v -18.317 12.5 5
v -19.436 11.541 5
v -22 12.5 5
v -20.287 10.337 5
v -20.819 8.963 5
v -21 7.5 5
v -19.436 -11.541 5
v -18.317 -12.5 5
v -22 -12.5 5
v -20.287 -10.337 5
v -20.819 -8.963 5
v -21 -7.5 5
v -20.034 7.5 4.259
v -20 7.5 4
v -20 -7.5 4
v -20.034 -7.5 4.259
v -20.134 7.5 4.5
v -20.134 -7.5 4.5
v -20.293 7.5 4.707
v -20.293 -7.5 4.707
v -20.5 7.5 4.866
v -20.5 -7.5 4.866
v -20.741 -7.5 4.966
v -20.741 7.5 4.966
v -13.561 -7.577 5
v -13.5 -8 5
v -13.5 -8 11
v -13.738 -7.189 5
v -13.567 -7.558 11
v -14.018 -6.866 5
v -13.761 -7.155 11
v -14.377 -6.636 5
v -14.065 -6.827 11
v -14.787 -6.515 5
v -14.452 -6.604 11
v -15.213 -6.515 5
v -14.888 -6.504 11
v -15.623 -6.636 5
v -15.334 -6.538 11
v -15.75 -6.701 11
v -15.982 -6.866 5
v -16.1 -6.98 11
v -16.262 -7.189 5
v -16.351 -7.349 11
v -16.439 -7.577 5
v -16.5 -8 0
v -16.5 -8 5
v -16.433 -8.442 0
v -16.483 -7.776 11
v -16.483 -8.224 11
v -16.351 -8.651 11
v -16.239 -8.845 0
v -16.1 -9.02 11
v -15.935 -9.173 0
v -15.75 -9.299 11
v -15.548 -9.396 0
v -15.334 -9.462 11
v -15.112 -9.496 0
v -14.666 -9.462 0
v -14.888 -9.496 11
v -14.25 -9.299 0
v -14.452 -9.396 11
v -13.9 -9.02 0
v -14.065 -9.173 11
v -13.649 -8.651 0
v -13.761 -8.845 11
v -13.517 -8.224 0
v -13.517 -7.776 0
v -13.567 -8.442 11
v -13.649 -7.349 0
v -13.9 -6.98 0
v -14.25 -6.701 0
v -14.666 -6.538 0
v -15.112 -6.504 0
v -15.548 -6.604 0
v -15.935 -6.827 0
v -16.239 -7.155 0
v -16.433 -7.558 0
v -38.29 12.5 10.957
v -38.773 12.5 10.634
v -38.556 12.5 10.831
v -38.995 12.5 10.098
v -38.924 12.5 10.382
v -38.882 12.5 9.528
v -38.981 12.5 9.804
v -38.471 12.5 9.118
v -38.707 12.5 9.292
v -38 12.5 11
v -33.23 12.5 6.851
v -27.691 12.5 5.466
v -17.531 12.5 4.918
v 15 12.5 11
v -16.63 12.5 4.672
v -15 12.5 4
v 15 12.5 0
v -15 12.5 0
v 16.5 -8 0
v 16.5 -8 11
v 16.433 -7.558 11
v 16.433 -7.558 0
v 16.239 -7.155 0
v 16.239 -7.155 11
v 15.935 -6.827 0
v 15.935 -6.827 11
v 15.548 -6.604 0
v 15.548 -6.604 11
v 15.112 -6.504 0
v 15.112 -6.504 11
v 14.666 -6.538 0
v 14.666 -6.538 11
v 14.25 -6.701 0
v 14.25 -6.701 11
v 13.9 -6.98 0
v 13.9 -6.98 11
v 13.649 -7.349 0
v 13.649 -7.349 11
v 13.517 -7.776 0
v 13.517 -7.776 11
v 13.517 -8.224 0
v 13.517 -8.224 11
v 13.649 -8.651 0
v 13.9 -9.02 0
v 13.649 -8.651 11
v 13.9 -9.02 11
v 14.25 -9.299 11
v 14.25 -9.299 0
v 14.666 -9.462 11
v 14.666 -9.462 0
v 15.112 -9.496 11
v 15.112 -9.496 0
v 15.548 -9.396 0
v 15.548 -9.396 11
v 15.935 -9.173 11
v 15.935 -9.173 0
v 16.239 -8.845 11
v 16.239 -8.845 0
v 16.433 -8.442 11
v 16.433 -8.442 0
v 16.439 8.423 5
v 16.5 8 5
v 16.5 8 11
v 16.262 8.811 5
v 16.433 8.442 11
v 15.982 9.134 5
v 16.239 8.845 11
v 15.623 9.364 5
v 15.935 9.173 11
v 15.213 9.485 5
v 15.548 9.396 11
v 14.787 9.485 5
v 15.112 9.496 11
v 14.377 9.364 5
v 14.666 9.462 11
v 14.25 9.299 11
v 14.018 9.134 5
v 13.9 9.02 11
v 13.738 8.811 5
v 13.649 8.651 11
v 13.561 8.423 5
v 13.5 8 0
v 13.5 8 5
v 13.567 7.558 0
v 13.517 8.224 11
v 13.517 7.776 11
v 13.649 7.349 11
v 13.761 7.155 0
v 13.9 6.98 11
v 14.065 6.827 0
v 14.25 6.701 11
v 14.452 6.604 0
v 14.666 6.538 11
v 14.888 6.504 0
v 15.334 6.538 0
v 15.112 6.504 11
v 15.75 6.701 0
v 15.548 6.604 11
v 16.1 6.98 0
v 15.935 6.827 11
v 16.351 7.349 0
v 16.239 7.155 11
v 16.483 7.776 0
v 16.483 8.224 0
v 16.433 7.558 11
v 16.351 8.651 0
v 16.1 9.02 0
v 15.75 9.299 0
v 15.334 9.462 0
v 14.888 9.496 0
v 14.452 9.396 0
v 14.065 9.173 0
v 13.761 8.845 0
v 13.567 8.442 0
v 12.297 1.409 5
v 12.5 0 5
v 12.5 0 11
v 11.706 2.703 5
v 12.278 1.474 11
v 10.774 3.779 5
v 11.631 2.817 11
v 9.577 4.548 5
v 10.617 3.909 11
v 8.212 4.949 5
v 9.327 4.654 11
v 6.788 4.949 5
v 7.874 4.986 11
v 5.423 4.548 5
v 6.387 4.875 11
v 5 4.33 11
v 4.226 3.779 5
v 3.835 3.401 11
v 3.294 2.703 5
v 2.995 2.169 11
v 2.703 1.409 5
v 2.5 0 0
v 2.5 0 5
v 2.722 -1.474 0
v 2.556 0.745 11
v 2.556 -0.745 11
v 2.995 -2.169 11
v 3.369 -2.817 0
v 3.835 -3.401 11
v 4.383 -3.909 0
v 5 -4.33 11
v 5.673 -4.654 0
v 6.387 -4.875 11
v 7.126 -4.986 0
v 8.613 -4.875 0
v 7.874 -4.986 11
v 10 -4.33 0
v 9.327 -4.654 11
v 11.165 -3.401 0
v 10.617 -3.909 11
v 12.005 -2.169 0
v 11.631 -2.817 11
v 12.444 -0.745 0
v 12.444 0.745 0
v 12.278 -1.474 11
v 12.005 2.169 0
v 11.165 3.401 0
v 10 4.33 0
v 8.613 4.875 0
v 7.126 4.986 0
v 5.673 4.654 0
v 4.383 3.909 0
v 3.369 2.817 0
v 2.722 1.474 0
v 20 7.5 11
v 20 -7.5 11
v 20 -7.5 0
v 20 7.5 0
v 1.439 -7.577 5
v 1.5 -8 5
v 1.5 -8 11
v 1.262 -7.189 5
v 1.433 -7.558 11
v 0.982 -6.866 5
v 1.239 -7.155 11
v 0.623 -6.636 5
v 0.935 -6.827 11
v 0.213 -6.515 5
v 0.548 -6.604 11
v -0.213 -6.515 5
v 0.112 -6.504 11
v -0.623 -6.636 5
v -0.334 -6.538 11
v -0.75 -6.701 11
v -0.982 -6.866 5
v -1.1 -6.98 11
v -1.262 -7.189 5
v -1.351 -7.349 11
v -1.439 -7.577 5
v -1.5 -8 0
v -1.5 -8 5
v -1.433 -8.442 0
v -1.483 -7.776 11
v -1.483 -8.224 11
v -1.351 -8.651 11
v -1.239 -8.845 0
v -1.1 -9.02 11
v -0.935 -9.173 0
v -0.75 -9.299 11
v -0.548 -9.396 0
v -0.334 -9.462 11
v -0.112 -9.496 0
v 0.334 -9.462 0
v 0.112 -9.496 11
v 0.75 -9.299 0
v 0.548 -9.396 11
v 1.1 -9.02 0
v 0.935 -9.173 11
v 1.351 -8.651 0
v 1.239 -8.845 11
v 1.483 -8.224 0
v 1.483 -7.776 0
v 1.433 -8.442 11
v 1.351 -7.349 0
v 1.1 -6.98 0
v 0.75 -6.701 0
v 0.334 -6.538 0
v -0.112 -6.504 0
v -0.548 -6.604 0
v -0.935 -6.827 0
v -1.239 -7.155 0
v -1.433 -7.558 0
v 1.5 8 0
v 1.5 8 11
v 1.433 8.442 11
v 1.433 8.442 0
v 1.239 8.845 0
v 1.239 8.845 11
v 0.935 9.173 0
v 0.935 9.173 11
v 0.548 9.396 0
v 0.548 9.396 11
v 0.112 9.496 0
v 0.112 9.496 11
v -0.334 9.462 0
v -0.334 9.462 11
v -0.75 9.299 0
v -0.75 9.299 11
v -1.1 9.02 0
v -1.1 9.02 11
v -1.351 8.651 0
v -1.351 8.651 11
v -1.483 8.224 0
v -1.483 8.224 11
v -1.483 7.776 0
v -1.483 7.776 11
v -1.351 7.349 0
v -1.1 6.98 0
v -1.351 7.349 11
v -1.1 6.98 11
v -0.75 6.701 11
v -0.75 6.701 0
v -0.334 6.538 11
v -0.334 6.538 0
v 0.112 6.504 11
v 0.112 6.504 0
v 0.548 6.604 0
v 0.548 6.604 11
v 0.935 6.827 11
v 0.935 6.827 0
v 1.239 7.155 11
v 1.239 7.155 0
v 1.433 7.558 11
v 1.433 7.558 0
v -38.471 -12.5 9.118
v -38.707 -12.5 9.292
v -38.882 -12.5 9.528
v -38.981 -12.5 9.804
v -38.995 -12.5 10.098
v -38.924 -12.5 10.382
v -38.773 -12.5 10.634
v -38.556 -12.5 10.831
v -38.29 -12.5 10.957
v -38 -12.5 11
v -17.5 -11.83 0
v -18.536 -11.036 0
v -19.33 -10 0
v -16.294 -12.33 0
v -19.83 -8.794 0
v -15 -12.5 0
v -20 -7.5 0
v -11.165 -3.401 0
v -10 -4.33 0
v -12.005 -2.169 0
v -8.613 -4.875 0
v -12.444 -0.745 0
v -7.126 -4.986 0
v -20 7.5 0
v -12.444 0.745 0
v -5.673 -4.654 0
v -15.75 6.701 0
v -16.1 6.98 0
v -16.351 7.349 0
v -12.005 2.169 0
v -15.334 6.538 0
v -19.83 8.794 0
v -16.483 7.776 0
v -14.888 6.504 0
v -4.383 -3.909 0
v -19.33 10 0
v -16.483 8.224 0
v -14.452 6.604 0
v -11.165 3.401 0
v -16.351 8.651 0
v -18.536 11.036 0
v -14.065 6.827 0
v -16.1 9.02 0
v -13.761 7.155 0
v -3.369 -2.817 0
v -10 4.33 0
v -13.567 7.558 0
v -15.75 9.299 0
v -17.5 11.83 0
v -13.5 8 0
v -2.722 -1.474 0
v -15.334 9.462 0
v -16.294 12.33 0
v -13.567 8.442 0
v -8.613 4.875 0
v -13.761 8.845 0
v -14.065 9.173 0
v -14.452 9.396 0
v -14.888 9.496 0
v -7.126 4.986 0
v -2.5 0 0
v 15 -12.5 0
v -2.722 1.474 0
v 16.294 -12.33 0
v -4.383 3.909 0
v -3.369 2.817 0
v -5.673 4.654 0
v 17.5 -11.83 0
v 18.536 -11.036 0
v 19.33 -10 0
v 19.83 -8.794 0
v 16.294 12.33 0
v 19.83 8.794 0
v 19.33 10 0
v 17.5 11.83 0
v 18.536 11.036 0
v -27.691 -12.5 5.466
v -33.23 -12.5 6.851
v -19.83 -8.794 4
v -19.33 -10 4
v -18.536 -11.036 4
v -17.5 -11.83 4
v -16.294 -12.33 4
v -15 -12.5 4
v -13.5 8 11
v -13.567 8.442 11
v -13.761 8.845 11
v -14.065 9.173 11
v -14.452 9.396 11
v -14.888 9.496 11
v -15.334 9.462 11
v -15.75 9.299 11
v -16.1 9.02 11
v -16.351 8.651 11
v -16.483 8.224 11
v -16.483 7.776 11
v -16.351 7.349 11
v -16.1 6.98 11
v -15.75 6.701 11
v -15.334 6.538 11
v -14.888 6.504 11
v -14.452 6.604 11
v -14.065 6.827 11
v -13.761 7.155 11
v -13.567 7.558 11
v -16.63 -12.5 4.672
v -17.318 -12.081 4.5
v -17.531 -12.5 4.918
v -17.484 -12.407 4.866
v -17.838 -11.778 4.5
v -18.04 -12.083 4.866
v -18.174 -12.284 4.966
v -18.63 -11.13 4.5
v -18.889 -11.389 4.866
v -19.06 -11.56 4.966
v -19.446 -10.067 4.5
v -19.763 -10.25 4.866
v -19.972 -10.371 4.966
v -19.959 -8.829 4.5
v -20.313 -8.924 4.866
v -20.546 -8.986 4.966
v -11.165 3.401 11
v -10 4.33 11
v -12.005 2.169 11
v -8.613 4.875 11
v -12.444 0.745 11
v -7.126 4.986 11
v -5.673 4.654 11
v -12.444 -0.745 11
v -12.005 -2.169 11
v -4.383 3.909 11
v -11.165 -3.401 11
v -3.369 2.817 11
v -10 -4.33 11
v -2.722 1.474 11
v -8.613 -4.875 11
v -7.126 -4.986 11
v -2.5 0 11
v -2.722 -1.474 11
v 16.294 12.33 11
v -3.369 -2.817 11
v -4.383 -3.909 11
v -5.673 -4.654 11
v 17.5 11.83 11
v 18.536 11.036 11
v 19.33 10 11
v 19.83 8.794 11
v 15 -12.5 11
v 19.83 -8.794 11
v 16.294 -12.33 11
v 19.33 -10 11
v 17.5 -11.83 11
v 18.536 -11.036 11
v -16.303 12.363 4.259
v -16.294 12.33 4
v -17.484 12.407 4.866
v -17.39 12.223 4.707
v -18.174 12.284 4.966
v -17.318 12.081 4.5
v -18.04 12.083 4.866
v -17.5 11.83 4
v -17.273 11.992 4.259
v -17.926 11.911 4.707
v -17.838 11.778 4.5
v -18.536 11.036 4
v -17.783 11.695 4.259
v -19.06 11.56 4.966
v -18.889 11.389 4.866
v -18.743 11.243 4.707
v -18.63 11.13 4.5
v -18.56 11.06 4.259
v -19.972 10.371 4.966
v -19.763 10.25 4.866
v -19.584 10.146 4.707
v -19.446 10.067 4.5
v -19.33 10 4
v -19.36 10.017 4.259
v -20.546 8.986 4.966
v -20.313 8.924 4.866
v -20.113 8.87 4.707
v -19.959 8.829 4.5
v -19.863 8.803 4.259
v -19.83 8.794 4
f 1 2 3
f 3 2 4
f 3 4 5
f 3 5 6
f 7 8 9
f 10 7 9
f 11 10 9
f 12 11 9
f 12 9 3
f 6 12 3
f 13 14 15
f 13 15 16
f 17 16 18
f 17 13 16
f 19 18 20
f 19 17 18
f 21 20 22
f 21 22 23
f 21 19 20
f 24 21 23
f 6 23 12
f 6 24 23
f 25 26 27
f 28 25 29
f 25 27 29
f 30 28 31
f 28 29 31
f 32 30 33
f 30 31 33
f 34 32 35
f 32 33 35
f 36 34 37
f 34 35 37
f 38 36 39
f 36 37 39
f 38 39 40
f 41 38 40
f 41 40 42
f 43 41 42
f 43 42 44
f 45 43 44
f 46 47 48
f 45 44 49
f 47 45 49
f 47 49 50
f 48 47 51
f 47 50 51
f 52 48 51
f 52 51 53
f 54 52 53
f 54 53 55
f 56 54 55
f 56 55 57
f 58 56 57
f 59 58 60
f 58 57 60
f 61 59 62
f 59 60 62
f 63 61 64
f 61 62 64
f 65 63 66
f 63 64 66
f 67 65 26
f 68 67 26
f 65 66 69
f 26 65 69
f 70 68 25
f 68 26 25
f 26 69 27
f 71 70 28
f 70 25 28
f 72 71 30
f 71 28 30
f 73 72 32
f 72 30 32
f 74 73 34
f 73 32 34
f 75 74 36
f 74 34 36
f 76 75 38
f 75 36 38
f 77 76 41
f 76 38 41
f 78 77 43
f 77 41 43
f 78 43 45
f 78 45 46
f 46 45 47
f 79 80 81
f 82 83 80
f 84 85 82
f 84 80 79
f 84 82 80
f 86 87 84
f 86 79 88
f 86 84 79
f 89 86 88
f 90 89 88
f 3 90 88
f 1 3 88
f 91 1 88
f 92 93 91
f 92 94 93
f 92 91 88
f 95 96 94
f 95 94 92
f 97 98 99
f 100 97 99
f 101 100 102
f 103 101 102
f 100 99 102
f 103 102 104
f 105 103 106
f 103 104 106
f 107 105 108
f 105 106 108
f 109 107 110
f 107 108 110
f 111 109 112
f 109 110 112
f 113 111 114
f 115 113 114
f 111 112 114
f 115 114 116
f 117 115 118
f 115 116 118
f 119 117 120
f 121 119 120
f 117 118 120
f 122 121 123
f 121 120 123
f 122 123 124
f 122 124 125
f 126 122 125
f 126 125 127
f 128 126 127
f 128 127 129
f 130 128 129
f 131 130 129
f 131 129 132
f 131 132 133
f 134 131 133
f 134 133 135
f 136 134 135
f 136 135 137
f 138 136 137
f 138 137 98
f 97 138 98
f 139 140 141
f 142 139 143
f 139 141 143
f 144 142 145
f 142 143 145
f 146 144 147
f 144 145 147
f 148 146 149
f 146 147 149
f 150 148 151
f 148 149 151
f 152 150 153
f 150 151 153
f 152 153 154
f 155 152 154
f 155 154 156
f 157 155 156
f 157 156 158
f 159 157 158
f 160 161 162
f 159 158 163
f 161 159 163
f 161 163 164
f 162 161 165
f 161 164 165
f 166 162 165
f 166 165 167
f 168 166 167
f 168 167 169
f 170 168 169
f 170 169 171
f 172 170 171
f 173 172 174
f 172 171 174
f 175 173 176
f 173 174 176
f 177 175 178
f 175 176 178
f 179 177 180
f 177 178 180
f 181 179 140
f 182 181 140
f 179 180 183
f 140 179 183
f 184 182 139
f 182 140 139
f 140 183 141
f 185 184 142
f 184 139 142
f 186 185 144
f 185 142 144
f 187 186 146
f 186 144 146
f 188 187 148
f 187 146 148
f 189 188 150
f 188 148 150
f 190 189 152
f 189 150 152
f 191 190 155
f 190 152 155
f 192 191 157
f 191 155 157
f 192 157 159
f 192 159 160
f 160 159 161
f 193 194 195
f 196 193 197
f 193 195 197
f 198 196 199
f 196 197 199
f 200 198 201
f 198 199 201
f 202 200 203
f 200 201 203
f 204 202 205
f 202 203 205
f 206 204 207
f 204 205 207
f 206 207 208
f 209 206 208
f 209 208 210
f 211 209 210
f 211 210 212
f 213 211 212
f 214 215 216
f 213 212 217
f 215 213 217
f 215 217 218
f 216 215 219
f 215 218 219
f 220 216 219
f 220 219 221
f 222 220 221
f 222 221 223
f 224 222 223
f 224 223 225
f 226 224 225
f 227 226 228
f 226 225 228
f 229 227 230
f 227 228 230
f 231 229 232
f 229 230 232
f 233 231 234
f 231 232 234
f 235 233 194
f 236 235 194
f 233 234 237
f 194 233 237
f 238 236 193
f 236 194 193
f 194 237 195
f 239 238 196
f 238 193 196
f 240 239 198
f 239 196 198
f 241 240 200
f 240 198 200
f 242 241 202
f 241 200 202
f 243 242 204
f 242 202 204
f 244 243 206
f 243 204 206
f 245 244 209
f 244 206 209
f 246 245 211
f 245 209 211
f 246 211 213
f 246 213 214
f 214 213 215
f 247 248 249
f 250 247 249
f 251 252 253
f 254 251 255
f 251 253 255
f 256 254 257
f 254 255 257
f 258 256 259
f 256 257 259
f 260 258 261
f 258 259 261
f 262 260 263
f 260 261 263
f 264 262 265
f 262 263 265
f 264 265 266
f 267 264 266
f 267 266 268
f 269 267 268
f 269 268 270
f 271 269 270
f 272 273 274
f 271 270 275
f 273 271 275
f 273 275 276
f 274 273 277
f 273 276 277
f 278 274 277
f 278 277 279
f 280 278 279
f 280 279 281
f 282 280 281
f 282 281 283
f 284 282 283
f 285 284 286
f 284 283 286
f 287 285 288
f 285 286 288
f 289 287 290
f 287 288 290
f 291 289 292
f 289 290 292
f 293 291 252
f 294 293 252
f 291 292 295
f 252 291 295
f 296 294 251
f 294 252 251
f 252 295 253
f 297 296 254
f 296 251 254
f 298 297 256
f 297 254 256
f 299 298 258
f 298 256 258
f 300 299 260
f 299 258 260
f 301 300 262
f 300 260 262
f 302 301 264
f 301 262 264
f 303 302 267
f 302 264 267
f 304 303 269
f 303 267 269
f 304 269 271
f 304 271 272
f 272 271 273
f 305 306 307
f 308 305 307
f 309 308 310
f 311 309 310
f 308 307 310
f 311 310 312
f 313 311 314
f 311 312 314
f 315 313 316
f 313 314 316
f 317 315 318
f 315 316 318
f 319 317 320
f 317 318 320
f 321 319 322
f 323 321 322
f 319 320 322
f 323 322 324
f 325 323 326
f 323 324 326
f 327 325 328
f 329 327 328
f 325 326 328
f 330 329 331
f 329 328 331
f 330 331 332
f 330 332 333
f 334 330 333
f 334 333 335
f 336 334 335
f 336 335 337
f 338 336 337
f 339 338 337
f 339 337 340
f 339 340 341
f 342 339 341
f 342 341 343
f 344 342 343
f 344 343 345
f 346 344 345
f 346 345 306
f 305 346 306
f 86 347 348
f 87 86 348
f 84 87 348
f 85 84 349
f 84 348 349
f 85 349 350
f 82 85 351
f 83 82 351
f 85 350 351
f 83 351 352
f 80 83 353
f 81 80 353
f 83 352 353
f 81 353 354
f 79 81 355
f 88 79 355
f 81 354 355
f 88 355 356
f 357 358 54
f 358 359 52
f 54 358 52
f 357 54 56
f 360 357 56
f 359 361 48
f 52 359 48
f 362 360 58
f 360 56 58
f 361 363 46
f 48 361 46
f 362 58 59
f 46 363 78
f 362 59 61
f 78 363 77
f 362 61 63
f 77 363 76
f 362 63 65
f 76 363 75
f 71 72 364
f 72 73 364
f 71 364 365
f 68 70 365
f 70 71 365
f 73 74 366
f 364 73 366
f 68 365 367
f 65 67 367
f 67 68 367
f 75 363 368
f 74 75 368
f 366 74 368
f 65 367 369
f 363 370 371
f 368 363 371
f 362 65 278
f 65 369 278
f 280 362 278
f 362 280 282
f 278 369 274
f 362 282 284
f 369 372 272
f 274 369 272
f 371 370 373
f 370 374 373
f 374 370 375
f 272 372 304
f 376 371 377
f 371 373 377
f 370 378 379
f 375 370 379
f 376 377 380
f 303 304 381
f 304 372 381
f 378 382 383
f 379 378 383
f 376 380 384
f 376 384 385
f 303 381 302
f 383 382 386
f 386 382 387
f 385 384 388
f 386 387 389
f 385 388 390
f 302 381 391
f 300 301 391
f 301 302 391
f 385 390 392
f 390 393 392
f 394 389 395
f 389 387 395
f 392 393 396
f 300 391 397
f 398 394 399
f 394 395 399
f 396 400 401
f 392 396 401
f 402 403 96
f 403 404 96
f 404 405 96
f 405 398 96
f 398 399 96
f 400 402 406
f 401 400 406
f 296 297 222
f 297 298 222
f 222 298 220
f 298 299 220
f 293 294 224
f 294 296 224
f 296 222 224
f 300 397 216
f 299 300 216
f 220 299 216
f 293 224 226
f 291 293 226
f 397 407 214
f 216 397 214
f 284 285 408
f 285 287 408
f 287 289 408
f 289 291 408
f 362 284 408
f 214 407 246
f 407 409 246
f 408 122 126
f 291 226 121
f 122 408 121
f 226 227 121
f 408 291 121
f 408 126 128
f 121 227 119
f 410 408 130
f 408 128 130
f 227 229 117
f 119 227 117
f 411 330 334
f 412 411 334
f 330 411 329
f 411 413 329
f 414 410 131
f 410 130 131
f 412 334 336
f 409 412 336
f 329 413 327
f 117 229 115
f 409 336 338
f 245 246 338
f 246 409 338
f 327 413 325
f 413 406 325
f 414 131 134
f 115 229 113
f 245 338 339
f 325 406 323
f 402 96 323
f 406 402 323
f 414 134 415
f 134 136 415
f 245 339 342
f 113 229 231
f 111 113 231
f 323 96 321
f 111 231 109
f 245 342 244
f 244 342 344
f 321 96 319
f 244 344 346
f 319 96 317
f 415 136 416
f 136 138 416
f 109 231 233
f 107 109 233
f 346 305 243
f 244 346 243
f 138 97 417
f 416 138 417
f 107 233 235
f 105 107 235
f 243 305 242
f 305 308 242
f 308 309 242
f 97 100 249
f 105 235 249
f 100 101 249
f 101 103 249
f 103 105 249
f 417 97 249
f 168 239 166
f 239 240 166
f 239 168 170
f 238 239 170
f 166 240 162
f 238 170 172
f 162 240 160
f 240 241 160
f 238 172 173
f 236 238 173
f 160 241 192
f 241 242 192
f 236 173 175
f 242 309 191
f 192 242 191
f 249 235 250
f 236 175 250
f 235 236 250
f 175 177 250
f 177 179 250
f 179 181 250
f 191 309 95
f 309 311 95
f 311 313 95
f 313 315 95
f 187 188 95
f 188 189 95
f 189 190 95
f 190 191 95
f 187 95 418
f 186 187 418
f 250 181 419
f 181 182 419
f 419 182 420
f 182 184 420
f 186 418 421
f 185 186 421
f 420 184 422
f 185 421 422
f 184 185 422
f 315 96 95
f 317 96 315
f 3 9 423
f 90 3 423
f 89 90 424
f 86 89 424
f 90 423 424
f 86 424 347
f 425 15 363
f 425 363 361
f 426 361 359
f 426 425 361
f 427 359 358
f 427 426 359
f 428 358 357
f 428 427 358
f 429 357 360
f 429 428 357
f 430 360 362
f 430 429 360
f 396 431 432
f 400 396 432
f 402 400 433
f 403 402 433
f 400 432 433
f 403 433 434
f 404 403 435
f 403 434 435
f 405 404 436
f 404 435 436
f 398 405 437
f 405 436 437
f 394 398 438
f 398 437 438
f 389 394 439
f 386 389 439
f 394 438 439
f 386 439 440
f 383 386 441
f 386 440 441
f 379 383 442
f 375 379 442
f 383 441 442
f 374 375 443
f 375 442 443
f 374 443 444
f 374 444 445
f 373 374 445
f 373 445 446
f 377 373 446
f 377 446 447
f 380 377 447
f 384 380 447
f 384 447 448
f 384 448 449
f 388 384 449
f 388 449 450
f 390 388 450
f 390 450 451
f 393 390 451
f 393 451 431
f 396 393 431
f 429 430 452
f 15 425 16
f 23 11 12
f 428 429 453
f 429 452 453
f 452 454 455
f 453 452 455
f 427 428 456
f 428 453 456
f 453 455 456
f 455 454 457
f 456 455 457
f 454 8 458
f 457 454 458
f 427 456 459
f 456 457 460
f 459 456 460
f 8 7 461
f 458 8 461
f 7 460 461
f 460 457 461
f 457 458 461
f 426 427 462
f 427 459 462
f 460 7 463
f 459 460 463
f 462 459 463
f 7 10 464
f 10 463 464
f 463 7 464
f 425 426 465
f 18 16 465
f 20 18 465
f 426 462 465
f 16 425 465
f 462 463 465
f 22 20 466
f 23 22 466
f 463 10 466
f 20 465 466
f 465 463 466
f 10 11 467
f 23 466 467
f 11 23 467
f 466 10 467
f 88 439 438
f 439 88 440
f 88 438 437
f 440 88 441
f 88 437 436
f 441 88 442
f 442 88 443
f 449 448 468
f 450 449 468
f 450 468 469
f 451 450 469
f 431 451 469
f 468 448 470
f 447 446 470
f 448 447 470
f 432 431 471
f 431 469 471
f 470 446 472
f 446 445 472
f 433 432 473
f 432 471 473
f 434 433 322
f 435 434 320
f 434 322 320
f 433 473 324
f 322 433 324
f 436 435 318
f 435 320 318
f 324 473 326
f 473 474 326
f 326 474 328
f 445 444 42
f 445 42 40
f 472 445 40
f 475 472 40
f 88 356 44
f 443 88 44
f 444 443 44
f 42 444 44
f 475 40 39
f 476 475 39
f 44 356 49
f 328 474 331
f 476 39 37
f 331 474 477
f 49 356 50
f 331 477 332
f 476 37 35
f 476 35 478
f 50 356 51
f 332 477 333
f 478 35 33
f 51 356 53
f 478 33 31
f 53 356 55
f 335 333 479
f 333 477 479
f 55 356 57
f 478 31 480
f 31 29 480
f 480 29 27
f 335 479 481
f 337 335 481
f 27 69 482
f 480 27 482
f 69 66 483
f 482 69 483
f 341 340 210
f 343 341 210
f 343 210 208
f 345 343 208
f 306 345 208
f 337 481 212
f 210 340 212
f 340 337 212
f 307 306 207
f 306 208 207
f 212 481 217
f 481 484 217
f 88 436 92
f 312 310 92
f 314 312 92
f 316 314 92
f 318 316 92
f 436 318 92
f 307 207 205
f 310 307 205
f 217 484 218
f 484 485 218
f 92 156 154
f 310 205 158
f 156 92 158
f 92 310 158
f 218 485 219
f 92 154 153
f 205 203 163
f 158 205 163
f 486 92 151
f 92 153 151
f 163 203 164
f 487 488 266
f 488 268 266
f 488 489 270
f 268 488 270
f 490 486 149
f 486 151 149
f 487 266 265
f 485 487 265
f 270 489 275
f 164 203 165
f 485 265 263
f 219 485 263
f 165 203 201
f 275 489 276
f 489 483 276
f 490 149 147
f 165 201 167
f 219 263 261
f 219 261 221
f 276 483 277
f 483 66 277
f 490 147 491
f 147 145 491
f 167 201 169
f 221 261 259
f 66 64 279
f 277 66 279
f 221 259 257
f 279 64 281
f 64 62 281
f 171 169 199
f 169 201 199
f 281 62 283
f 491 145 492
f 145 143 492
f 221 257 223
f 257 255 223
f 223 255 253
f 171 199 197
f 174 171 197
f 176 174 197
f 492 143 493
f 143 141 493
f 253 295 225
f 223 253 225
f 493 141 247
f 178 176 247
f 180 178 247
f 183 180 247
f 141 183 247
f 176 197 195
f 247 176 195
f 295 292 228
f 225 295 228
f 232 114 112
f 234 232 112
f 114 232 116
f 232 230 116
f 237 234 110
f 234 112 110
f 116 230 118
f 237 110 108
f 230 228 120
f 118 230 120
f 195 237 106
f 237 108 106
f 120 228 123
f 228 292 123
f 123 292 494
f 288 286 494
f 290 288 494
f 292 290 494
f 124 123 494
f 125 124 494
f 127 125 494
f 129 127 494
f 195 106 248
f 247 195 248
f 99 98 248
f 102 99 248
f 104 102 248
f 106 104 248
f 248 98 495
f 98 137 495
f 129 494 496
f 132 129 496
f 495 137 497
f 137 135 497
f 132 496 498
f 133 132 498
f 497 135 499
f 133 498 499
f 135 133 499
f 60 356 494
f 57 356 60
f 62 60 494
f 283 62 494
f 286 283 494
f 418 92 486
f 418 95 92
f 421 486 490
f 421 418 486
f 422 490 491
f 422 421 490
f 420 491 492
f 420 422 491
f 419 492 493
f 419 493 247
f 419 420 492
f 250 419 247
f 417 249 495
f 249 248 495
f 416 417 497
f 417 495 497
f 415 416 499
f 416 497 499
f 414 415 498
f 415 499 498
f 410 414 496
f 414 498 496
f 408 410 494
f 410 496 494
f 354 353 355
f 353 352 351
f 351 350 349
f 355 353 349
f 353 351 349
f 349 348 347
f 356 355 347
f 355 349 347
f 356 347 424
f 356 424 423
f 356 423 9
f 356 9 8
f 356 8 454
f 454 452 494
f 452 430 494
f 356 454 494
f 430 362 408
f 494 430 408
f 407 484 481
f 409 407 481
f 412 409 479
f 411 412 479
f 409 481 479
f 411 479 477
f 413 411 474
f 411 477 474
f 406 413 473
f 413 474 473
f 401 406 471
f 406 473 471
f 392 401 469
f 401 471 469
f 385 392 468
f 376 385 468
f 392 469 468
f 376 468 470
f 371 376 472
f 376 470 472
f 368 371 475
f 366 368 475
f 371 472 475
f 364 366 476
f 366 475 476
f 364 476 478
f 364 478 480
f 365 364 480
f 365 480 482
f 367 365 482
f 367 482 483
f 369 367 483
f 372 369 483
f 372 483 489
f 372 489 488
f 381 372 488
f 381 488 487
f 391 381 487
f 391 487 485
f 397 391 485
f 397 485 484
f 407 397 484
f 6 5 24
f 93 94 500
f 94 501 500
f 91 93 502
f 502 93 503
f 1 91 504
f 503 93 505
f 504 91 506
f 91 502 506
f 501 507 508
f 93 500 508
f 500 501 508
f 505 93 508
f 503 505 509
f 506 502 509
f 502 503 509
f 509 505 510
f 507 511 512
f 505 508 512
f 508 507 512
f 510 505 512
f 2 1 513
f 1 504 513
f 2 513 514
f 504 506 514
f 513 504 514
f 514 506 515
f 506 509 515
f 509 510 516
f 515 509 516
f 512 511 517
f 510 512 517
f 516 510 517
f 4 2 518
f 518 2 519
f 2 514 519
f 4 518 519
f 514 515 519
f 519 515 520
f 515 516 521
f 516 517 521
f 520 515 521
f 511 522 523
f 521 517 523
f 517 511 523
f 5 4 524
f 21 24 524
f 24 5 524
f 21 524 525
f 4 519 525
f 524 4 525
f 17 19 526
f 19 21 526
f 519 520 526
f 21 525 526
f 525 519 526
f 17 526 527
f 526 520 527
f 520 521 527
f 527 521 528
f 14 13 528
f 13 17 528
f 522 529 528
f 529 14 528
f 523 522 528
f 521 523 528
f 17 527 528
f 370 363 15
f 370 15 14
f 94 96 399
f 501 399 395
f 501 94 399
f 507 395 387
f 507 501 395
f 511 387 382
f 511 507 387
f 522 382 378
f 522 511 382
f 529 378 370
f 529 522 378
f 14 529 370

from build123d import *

# Parameters (mm, degrees)
SKETCH_2_W           = 40
SKETCH_2_H           = 25
EXTRUDE_1_DEPTH      = 5
SKETCH_3_R           = 1.5
CUT_EXTRUDE_1_DEPTH  = 25.109126902
SKETCH_4_R           = 5
CUT_EXTRUDE_2_DEPTH  = 25.109126902
EXTRUDE_2_DEPTH      = 12.5
EXTRUDE_2_DEPTH_BACK = 12.5
SKETCH_7_R           = 5
SKETCH_7_R_2         = 1.5
CUT_EXTRUDE_3_DEPTH  = 43.405777908
FILLET_1_R           = 5
FILLET_2_R           = 1


with BuildPart() as part:
    # 草图2 → 凸台-拉伸1 (new body)
    with BuildSketch(Plane.XY):
        Rectangle(SKETCH_2_W, SKETCH_2_H)
    extrude(amount=EXTRUDE_1_DEPTH)

    # 草图3 → 切除-拉伸1 (cut, through all)
    with BuildSketch(Plane.XY.offset(5)):
        with Locations((-15, 8)):
            Circle(SKETCH_3_R)
        with Locations((0, 8)):
            Circle(SKETCH_3_R)
        with Locations(Location((15, 8, 0), (0, 0, 180))):
            Circle(SKETCH_3_R)
        with Locations((15, -8)):
            Circle(SKETCH_3_R)
        with Locations(Location((0, -8, 0), (0, 0, 180))):
            Circle(SKETCH_3_R)
        with Locations(Location((-15, -8, 0), (0, 0, 180))):
            Circle(SKETCH_3_R)
    extrude(amount=-CUT_EXTRUDE_1_DEPTH, mode=Mode.SUBTRACT)

    # 草图4 → 切除-拉伸2 (cut, through all)
    with BuildSketch(Plane.XY.offset(5)):
        with Locations((-7.5, 0)):
            Circle(SKETCH_4_R)
        with Locations(Location((7.5, 0, 0), (0, 0, 180))):
            Circle(SKETCH_4_R)
    extrude(amount=-CUT_EXTRUDE_2_DEPTH, mode=Mode.SUBTRACT)

    # 草图6 → 凸台-拉伸2 (add, two sides: drawn at the far end of the back side and taken through both)
    with BuildSketch(Plane(origin=(0, 0, 0), x_dir=(1, 0, 0), z_dir=(0, 1, 0)).offset(-EXTRUDE_2_DEPTH_BACK)):
        with BuildLine():
            Line((-20, -5), (-22, -5))
            ThreePointArc((-22, -5), (-30.488746876, -6.045012495), (-38.470588235, -9.117647059))
            ThreePointArc((-38.470588235, -9.117647059), (-38.9701425, -10.242535625), (-38, -11))
            Line((-38, -11), (20, -11))
            Line((20, -11), (20, -5))
            Line((20, -5), (-20, -5))
        make_face()
    extrude(amount=EXTRUDE_2_DEPTH + EXTRUDE_2_DEPTH_BACK)

    # 草图7 → 切除-拉伸3 (cut, through all)
    with BuildSketch(Plane.XY.offset(11)):
        with Locations((7.5, 0)):
            Circle(SKETCH_7_R)
        with Locations((-15, -8)):
            Circle(SKETCH_7_R_2)
        with Locations((-7.5, 0)):
            Circle(SKETCH_7_R)
        with Locations((0, -8)):
            Circle(SKETCH_7_R_2)
        with Locations((15, -8)):
            Circle(SKETCH_7_R_2)
        with Locations((0, 8)):
            Circle(SKETCH_7_R_2)
        with Locations((-15, 8)):
            Circle(SKETCH_7_R_2)
        with Locations((15, 8)):
            Circle(SKETCH_7_R_2)
    extrude(amount=-CUT_EXTRUDE_3_DEPTH, mode=Mode.SUBTRACT)

    # 圆角1
    fillet_1_edges = [part.edges().sort_by_distance(p)[0] for p in [
        (20, -12.5, 5.5),
        (-20, -12.5, 2.5),
        (-20, 12.5, 2.5),
        (20, 12.5, 5.5),
    ]]
    fillet(fillet_1_edges, radius=FILLET_1_R)

    # 圆角2
    # the kernel refuses this fillet: 1 mm, written as the material it adds along each edge
    with BuildSketch(Plane(origin=(-20, 7.5, 5), x_dir=(0, 0, -1), z_dir=(0, -1, 0))) as fillet_2_piece_1:
        with BuildLine():
            CenterArc((FILLET_2_R, -FILLET_2_R), FILLET_2_R, 90, 90)
            Line((0, -FILLET_2_R), (0, 0))
            Line((0, 0), (FILLET_2_R, 0))
        make_face()
    extrude(amount=15)
    with BuildSketch(Plane(origin=(-15, -7.5, 5), x_dir=(0.7515057138603054, -0.6597265812708418, 0), z_dir=(0.6597265812708418, 0.7515057138603054, 0))) as fillet_2_piece_2_section:
        with BuildLine():
            CenterArc((5 + FILLET_2_R, FILLET_2_R), FILLET_2_R, 180, 90)
            Line((5, FILLET_2_R), (5, 0))
            Line((5, 0), (5 + FILLET_2_R, 0))
        make_face()
    fillet_2_piece_2 = revolve(axis=Axis((-15, -7.5, 5), (0, 0, -1)), revolution_arc=138.720976341, mode=Mode.PRIVATE)
    fillet_2_piece_2 = split(fillet_2_piece_2, bisect_by=Plane(origin=(-15, -12.5, 5), z_dir=(0, 1, 0)), keep=Keep.TOP, mode=Mode.PRIVATE)
    add(fillet_2_piece_2)
    with BuildSketch(Plane(origin=(-15, 7.5, 5), x_dir=(0.7515057138603056, 0.6597265812708417, 0), z_dir=(0.6597265812708417, -0.7515057138603056, 0))) as fillet_2_piece_3_section:
        with BuildLine():
            CenterArc((5 + FILLET_2_R, -FILLET_2_R), FILLET_2_R, 90, 90)
            Line((5 + FILLET_2_R, 0), (5, 0))
            Line((5, 0), (5, -FILLET_2_R))
        make_face()
    fillet_2_piece_3 = revolve(axis=Axis((-15, 7.5, 5), (0, 0, 1)), revolution_arc=138.720976341, mode=Mode.PRIVATE)
    fillet_2_piece_3 = split(fillet_2_piece_3, bisect_by=Plane(origin=(-15, 12.5, 5), z_dir=(0, -1, 0)), keep=Keep.TOP, mode=Mode.PRIVATE)
    add(fillet_2_piece_3)


solid = part.part
